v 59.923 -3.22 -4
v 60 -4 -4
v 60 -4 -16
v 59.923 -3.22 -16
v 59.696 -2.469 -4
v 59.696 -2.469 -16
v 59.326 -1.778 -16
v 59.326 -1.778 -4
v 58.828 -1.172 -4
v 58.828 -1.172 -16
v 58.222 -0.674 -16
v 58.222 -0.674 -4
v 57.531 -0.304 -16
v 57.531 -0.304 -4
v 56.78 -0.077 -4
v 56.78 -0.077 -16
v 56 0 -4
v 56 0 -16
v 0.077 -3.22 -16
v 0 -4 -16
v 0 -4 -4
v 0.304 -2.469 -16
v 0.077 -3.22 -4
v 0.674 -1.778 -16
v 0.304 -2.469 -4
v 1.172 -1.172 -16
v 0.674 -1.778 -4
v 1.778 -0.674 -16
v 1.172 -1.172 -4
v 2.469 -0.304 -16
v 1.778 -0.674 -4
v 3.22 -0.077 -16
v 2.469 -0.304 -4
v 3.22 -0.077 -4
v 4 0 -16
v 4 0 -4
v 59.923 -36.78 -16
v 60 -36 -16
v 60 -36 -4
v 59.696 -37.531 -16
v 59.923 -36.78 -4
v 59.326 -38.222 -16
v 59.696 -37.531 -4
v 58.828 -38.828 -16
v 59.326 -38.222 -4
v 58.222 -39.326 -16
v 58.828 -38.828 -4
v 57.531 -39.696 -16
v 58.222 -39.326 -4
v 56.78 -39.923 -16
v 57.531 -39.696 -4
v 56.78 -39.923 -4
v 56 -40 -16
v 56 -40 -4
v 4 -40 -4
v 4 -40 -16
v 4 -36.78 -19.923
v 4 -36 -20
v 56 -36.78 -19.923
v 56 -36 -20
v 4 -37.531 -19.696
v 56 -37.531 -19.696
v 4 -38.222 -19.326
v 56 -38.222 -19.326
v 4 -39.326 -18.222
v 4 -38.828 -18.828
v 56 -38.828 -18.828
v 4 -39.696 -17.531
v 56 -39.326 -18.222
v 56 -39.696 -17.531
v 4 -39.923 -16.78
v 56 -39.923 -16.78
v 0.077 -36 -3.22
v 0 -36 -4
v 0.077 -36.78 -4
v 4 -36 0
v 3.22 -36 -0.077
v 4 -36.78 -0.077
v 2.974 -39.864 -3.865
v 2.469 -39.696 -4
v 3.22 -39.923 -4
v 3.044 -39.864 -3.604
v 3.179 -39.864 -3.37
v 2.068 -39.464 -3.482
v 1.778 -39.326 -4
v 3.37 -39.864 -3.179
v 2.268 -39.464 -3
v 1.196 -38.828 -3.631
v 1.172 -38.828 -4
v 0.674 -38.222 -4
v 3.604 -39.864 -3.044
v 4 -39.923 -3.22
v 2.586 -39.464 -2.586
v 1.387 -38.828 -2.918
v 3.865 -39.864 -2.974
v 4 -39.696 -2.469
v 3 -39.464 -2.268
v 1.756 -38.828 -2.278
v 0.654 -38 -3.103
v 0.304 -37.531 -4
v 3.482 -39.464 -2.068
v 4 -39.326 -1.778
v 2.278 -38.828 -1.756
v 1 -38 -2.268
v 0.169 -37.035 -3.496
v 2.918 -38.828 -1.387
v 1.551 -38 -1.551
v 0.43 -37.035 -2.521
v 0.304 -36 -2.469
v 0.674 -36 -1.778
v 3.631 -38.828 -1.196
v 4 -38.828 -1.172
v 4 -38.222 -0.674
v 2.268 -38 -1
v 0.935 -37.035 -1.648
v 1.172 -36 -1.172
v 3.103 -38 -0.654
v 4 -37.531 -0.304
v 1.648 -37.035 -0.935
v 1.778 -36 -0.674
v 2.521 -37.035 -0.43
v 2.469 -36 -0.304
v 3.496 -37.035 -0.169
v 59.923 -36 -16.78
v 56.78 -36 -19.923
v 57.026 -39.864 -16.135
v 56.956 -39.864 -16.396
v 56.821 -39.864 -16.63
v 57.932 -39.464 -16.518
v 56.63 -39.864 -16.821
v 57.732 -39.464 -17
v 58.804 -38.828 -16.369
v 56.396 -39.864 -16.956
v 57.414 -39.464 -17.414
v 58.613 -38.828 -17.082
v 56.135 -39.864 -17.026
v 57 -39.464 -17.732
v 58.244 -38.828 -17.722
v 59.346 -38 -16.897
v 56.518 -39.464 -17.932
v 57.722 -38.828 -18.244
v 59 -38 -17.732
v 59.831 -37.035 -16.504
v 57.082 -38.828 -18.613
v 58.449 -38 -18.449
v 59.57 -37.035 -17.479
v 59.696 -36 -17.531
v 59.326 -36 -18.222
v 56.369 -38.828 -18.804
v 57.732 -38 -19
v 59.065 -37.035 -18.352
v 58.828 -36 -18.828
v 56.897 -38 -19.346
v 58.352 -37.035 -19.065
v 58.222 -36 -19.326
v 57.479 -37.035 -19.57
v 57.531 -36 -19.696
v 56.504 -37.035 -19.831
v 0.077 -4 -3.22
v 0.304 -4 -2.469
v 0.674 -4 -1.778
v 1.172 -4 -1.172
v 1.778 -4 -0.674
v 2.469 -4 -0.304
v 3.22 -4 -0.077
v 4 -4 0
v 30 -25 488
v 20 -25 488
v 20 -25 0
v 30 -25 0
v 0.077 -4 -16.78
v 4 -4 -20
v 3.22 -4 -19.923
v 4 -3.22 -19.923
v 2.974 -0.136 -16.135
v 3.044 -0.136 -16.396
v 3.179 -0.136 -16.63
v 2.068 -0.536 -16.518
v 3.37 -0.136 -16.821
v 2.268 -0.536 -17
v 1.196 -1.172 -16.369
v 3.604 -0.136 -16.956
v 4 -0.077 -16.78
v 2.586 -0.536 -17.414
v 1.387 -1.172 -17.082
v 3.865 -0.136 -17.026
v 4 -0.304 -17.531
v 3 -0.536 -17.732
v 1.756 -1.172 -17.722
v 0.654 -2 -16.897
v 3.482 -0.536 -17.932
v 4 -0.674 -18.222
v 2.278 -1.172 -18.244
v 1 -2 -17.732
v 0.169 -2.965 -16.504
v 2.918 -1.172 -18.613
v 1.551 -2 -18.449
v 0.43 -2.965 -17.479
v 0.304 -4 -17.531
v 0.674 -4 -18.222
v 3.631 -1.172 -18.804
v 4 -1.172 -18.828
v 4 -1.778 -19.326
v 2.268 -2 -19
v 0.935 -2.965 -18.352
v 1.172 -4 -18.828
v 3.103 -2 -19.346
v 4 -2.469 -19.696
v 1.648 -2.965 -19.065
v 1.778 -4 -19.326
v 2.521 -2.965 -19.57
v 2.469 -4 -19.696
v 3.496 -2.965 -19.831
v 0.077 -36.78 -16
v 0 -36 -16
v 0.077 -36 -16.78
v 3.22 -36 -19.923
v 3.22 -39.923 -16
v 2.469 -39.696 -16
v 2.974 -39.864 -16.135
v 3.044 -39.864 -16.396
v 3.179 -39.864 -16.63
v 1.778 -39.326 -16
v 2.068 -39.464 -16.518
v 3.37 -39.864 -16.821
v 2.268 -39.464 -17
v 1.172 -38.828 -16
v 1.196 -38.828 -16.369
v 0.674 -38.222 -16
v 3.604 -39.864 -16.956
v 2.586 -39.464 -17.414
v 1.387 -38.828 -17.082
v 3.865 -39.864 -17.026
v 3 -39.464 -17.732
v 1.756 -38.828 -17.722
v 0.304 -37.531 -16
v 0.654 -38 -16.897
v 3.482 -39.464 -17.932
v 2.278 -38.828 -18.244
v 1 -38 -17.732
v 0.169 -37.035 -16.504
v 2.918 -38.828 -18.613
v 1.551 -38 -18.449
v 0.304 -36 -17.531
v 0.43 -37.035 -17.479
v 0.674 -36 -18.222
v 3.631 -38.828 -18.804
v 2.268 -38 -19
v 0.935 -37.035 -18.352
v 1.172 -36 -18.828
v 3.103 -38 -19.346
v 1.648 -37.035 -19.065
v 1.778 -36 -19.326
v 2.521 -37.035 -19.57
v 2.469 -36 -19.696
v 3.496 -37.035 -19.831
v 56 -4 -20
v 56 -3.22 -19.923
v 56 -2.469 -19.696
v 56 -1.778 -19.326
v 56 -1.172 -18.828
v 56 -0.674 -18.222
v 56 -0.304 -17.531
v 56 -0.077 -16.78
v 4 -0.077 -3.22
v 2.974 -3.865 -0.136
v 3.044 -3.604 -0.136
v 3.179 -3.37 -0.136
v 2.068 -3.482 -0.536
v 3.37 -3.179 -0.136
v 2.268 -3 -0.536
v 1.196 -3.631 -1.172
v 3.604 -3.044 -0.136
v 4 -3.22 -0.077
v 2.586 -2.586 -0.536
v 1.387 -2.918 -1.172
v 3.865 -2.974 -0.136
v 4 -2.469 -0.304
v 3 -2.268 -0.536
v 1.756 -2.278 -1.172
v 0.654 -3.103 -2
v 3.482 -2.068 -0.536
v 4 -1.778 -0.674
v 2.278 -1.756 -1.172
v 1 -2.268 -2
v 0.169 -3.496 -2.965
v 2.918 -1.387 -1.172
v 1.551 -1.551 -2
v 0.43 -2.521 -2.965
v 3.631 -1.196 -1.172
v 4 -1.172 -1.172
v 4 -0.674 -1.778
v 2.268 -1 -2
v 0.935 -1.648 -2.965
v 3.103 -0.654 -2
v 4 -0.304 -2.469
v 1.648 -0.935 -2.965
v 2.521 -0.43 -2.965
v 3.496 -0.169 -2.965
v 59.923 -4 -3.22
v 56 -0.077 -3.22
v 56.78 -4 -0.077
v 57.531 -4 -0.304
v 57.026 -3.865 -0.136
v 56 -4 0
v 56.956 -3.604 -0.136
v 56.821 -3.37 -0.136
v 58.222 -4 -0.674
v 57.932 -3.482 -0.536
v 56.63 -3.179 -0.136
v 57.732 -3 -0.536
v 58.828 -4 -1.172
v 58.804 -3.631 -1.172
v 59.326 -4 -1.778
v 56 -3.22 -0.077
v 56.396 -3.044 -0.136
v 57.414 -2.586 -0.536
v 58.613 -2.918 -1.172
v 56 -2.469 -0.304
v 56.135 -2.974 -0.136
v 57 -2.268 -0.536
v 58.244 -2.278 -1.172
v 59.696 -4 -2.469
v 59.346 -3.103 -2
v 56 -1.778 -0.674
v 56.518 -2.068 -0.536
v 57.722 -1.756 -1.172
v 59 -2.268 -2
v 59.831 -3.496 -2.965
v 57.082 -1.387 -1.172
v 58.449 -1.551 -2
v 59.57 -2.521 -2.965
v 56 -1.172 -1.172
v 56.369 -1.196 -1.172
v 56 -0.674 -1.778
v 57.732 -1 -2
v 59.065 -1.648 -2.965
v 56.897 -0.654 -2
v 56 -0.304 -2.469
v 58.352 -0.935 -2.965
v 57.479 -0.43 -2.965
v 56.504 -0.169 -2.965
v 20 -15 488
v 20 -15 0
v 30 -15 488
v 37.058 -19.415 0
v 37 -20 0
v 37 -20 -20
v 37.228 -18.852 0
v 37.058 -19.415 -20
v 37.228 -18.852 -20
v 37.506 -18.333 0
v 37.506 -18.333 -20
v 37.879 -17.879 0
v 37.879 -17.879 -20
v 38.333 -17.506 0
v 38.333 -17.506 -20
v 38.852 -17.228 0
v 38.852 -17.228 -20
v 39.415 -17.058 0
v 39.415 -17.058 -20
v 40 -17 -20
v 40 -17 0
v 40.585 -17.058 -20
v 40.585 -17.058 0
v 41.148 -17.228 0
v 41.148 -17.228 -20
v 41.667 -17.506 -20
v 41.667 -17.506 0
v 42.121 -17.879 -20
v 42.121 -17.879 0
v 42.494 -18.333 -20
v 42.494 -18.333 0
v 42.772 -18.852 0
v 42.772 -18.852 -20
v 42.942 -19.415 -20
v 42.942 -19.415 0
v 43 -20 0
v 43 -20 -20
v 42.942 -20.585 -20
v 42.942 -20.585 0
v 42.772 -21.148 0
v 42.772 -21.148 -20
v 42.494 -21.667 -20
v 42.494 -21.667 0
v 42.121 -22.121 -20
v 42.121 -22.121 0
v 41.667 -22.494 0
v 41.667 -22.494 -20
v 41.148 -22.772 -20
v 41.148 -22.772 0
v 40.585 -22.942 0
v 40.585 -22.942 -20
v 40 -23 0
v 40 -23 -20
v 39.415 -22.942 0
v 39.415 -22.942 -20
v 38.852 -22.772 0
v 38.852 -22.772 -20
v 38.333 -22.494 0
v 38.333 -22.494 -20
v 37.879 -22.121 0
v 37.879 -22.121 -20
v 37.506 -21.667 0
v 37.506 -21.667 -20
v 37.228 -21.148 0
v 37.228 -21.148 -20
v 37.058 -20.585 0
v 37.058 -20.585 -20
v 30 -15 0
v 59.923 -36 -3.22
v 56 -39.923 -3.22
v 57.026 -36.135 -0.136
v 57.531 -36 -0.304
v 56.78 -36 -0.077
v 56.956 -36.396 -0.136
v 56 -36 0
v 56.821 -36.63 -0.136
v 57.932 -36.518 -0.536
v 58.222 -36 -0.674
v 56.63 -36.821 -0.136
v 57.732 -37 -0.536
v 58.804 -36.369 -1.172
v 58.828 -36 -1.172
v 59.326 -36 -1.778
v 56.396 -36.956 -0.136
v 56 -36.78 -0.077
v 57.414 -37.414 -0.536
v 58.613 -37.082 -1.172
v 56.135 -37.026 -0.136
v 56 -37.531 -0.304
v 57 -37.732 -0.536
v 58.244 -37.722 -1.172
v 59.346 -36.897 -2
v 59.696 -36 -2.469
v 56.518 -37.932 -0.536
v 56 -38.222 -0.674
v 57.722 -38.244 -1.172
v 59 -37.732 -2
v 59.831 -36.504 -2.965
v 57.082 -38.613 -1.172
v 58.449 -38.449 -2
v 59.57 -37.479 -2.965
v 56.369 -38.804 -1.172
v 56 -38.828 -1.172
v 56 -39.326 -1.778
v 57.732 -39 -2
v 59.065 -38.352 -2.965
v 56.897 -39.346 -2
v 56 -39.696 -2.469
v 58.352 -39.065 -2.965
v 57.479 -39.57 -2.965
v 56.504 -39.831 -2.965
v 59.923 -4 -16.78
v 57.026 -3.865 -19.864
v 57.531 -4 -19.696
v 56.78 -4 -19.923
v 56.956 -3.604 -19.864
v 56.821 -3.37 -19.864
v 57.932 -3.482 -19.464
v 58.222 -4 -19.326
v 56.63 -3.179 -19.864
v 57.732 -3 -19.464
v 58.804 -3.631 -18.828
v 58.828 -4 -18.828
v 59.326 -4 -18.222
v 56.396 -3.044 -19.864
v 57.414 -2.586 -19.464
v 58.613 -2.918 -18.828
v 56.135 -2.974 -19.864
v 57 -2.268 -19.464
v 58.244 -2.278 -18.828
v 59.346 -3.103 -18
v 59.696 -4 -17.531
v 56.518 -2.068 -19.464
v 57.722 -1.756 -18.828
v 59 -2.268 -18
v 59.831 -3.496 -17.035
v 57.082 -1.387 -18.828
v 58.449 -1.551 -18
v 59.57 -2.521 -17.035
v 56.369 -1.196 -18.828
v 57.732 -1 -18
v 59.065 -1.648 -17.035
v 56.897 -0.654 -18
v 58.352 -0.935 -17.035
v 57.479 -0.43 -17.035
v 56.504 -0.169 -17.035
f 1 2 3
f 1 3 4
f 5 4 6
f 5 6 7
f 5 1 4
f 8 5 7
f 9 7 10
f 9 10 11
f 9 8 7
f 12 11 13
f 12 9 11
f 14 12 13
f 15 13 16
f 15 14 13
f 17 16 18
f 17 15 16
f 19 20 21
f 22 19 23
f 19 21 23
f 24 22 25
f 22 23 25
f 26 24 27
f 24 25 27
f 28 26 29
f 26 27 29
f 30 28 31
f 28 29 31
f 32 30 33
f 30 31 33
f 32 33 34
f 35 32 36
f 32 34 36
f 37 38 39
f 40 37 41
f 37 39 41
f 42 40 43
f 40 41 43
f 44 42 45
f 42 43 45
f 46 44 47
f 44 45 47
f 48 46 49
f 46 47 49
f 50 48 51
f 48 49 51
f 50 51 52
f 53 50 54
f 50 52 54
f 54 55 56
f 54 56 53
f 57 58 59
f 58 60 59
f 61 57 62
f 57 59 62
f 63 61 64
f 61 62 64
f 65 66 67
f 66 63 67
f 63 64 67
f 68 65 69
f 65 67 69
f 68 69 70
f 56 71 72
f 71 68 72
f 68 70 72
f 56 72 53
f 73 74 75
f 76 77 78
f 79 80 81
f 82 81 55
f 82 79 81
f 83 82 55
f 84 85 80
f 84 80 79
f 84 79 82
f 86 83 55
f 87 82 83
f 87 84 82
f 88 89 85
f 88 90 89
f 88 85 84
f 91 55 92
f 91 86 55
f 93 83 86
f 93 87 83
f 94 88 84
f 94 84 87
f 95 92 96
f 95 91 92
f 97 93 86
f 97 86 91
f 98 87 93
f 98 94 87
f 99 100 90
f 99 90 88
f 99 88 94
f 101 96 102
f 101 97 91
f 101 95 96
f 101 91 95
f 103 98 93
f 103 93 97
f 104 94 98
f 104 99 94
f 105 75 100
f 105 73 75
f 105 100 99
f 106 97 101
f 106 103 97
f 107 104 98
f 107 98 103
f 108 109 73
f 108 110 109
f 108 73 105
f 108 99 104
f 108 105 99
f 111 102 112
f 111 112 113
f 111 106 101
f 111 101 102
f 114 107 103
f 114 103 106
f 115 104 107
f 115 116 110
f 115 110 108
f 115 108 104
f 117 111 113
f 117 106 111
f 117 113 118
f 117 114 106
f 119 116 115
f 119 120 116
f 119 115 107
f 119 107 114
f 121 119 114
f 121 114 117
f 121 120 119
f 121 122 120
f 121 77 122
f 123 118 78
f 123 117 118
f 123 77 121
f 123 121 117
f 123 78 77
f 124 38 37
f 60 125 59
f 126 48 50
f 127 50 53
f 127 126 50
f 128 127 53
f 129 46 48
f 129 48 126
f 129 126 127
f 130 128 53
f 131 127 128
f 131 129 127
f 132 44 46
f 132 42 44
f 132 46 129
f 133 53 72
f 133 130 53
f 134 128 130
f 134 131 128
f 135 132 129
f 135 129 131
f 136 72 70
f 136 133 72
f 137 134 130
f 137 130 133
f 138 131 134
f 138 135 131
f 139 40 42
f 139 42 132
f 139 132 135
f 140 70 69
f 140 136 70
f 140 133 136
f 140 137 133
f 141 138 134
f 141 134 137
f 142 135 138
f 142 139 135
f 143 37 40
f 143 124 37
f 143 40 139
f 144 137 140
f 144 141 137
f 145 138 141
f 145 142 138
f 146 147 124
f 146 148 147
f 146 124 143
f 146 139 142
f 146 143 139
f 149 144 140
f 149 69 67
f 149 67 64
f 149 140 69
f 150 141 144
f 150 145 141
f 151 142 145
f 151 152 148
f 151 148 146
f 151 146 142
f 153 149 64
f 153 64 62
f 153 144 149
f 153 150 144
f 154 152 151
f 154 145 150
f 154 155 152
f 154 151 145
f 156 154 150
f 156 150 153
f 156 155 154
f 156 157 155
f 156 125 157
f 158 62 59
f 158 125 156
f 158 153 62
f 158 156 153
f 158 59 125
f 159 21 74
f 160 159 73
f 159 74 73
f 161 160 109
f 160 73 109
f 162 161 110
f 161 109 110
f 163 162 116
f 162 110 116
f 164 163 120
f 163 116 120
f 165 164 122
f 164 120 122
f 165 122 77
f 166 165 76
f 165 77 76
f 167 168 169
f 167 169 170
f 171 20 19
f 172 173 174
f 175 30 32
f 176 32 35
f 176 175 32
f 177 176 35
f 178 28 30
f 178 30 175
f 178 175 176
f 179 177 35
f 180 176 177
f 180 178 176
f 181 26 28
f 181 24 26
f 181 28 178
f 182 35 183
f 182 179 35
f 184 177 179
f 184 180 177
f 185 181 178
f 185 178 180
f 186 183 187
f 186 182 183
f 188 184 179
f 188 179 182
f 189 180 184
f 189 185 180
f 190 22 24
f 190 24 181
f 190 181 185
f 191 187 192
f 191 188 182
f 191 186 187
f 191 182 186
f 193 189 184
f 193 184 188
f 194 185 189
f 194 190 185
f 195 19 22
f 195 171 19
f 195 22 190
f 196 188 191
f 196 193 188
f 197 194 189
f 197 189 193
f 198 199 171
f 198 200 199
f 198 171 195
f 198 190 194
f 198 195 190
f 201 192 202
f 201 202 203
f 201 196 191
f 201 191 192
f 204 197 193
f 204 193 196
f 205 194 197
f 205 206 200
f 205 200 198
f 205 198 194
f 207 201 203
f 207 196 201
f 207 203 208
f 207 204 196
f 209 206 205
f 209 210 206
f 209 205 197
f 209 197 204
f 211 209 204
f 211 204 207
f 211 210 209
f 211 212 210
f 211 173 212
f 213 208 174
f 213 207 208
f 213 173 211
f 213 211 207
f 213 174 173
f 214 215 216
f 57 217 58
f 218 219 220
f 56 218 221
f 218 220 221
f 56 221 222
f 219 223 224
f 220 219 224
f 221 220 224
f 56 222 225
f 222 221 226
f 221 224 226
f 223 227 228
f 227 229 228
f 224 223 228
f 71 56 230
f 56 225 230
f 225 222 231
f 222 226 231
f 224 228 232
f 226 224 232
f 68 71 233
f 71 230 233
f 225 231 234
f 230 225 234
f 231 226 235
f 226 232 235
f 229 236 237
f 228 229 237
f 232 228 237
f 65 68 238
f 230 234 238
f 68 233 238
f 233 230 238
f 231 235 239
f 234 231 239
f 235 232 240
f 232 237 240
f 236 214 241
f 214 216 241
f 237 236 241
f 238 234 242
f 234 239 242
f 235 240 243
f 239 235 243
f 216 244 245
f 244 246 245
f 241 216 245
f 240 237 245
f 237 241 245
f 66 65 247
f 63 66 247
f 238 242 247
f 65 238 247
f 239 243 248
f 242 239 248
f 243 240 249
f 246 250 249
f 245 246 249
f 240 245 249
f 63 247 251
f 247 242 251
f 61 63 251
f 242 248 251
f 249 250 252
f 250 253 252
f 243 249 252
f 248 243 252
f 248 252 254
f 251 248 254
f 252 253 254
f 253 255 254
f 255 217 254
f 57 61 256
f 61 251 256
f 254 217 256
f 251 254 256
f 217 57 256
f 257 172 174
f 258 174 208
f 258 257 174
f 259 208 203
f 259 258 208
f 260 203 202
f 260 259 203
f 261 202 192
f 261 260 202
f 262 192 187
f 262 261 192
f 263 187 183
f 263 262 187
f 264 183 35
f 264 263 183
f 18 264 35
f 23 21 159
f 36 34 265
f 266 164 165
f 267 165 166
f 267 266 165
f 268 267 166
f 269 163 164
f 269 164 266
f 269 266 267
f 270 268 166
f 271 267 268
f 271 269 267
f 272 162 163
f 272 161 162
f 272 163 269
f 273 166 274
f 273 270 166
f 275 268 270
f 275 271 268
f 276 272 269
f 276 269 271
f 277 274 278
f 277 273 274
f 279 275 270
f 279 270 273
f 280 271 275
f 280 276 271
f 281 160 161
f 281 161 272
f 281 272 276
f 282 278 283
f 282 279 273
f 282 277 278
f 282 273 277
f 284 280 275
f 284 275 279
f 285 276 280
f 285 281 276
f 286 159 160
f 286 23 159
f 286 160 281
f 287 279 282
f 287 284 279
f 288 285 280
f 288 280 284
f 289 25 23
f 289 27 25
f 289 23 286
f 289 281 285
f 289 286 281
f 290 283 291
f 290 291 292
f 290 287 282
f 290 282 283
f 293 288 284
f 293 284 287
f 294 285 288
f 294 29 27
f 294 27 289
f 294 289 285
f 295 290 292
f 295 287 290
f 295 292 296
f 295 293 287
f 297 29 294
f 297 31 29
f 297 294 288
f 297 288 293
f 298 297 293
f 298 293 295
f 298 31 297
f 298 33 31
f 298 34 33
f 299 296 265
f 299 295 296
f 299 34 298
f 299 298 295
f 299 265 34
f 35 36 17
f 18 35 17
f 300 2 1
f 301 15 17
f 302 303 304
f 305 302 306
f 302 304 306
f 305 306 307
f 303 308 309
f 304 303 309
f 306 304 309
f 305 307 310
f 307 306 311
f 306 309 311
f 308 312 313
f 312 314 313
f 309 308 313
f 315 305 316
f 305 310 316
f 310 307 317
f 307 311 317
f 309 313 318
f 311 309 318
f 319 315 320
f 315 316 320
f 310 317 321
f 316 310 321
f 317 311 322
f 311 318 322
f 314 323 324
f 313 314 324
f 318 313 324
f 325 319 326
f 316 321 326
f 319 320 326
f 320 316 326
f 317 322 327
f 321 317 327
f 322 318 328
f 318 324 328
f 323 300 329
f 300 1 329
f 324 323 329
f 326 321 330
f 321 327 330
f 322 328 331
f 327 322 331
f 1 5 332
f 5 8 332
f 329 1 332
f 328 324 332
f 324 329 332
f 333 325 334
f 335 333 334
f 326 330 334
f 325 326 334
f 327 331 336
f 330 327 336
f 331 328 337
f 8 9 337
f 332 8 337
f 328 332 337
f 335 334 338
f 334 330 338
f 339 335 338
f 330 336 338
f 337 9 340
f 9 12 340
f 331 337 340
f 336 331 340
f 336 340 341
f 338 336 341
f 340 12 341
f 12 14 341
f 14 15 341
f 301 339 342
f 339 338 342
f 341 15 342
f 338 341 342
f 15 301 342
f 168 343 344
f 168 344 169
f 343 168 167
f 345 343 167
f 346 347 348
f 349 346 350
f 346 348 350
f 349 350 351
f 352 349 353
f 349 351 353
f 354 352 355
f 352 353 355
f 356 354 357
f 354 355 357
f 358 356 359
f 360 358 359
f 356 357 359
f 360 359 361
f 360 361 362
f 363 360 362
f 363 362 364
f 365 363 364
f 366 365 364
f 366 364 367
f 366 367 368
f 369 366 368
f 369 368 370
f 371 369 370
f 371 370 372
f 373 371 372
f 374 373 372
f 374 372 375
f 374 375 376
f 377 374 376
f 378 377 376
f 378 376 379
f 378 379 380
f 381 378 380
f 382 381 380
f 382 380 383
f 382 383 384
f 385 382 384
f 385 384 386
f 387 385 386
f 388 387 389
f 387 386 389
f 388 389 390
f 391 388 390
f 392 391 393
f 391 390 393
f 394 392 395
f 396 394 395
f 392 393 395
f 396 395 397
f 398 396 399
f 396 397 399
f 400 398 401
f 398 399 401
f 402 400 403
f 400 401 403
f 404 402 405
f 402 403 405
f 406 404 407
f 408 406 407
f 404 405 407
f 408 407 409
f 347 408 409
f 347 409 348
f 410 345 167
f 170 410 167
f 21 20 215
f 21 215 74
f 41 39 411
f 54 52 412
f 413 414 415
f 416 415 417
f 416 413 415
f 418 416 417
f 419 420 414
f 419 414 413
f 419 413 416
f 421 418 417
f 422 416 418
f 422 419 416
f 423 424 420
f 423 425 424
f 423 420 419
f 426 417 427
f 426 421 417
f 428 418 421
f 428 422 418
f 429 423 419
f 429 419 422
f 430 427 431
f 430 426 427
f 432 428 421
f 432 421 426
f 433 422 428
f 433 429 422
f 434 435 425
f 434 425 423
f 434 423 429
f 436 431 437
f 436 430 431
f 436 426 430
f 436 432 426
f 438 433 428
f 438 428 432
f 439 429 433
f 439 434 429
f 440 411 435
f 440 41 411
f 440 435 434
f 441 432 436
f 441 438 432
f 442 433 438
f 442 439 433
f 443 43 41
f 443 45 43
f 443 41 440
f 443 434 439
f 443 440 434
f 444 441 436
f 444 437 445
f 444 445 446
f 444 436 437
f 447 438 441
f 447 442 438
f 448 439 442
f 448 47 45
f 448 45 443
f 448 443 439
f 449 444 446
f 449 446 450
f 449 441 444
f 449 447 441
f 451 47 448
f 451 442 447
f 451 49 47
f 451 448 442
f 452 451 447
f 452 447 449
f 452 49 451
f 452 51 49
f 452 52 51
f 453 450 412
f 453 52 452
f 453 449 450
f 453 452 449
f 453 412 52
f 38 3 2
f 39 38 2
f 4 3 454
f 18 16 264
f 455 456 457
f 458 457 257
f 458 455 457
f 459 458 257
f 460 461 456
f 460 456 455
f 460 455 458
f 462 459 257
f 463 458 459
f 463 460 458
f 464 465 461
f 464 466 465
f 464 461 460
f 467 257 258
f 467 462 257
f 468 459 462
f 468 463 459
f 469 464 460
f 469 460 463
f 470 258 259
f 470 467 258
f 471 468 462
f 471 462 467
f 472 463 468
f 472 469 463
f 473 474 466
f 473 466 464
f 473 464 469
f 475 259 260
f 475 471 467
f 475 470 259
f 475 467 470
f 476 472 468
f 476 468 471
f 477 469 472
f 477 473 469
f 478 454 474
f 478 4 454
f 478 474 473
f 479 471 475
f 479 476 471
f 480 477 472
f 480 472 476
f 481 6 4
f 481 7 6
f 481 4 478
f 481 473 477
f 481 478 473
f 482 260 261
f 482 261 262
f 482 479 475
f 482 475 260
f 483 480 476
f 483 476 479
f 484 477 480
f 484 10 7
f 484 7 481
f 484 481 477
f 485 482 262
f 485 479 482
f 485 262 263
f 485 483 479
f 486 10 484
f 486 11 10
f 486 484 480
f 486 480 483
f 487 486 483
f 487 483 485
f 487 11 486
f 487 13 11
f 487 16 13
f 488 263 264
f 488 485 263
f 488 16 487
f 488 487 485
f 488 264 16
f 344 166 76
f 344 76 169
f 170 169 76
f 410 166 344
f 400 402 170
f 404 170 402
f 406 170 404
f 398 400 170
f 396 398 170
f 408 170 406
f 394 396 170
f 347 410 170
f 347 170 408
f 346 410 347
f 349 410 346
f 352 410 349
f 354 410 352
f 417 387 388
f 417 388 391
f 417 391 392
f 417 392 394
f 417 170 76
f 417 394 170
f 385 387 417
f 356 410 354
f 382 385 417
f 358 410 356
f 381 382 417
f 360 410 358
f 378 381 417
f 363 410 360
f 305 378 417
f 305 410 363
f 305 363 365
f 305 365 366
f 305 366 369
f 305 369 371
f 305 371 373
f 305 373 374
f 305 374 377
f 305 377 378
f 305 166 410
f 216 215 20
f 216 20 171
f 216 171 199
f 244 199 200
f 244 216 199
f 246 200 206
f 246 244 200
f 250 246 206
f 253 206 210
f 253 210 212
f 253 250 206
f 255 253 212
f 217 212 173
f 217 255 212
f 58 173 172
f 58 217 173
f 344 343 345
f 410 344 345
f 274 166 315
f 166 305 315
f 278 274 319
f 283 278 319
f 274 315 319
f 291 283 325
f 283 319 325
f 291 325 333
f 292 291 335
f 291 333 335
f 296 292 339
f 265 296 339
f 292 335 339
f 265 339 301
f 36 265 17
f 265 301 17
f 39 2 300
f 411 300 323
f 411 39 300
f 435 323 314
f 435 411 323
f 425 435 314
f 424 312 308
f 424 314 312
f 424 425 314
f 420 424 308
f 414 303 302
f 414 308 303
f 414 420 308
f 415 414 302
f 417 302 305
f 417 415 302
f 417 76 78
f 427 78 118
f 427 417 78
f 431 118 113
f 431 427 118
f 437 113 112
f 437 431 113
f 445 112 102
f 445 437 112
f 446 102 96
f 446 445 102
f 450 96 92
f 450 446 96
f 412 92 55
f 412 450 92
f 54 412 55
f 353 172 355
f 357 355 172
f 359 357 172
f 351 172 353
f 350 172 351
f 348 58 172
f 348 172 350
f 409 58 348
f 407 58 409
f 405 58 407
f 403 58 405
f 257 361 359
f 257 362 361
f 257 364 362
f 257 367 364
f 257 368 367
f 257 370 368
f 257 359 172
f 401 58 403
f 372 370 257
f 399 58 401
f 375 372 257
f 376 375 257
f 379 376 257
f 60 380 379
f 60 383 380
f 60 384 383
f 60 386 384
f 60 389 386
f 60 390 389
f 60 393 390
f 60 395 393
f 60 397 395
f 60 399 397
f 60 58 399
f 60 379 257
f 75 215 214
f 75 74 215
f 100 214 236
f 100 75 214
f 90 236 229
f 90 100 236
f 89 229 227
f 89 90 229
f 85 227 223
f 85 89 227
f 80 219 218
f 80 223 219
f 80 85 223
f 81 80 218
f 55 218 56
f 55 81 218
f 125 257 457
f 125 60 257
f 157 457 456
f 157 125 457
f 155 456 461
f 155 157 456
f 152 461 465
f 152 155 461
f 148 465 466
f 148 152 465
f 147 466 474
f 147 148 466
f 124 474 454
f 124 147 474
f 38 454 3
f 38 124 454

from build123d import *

# Parameters (mm, degrees)
F0_W     = 60
F0_H     = 20
F1_DEPTH = 40
F3_R     = 4
F4_D     = 6
F5_W     = 10
F5_H     = 10
F6_DEPTH = 508


with BuildPart() as f1:
    # F0 (on Front) → F1 (new body)
    with BuildSketch(Plane.XZ):
        with Locations((30, -10)):
            Rectangle(F0_W, F0_H)
    extrude(amount=F1_DEPTH)

    # F3
    f3_edges = [f1.edges().sort_by_distance(p)[0] for p in [
        (60, 0, -10),
        (0, -20, -20),
        (0, 0, -10),
        (0, -20, 0),
        (0, -40, -10),
        (60, -20, -20),
        (60, -40, -10),
        (60, -20, 0),
        (30, -40, 0),
        (30, -40, -20),
        (30, 0, -20),
        (30, 0, 0),
    ]]
    fillet(f3_edges, radius=F3_R)

    # F4 (through all)
    with Locations(Plane.XY):
        with Locations((40, -20)):
            Hole(F4_D / 2)

    # F5 (on face) → F6 (join)
    with BuildSketch(Plane(origin=(0, 0, -20), x_dir=(1, 0, 0), z_dir=(0, 0, -1))):
        with Locations((25, 20)):
            Rectangle(F5_W, F5_H)
    extrude(amount=-F6_DEPTH)


solid = f1.part
